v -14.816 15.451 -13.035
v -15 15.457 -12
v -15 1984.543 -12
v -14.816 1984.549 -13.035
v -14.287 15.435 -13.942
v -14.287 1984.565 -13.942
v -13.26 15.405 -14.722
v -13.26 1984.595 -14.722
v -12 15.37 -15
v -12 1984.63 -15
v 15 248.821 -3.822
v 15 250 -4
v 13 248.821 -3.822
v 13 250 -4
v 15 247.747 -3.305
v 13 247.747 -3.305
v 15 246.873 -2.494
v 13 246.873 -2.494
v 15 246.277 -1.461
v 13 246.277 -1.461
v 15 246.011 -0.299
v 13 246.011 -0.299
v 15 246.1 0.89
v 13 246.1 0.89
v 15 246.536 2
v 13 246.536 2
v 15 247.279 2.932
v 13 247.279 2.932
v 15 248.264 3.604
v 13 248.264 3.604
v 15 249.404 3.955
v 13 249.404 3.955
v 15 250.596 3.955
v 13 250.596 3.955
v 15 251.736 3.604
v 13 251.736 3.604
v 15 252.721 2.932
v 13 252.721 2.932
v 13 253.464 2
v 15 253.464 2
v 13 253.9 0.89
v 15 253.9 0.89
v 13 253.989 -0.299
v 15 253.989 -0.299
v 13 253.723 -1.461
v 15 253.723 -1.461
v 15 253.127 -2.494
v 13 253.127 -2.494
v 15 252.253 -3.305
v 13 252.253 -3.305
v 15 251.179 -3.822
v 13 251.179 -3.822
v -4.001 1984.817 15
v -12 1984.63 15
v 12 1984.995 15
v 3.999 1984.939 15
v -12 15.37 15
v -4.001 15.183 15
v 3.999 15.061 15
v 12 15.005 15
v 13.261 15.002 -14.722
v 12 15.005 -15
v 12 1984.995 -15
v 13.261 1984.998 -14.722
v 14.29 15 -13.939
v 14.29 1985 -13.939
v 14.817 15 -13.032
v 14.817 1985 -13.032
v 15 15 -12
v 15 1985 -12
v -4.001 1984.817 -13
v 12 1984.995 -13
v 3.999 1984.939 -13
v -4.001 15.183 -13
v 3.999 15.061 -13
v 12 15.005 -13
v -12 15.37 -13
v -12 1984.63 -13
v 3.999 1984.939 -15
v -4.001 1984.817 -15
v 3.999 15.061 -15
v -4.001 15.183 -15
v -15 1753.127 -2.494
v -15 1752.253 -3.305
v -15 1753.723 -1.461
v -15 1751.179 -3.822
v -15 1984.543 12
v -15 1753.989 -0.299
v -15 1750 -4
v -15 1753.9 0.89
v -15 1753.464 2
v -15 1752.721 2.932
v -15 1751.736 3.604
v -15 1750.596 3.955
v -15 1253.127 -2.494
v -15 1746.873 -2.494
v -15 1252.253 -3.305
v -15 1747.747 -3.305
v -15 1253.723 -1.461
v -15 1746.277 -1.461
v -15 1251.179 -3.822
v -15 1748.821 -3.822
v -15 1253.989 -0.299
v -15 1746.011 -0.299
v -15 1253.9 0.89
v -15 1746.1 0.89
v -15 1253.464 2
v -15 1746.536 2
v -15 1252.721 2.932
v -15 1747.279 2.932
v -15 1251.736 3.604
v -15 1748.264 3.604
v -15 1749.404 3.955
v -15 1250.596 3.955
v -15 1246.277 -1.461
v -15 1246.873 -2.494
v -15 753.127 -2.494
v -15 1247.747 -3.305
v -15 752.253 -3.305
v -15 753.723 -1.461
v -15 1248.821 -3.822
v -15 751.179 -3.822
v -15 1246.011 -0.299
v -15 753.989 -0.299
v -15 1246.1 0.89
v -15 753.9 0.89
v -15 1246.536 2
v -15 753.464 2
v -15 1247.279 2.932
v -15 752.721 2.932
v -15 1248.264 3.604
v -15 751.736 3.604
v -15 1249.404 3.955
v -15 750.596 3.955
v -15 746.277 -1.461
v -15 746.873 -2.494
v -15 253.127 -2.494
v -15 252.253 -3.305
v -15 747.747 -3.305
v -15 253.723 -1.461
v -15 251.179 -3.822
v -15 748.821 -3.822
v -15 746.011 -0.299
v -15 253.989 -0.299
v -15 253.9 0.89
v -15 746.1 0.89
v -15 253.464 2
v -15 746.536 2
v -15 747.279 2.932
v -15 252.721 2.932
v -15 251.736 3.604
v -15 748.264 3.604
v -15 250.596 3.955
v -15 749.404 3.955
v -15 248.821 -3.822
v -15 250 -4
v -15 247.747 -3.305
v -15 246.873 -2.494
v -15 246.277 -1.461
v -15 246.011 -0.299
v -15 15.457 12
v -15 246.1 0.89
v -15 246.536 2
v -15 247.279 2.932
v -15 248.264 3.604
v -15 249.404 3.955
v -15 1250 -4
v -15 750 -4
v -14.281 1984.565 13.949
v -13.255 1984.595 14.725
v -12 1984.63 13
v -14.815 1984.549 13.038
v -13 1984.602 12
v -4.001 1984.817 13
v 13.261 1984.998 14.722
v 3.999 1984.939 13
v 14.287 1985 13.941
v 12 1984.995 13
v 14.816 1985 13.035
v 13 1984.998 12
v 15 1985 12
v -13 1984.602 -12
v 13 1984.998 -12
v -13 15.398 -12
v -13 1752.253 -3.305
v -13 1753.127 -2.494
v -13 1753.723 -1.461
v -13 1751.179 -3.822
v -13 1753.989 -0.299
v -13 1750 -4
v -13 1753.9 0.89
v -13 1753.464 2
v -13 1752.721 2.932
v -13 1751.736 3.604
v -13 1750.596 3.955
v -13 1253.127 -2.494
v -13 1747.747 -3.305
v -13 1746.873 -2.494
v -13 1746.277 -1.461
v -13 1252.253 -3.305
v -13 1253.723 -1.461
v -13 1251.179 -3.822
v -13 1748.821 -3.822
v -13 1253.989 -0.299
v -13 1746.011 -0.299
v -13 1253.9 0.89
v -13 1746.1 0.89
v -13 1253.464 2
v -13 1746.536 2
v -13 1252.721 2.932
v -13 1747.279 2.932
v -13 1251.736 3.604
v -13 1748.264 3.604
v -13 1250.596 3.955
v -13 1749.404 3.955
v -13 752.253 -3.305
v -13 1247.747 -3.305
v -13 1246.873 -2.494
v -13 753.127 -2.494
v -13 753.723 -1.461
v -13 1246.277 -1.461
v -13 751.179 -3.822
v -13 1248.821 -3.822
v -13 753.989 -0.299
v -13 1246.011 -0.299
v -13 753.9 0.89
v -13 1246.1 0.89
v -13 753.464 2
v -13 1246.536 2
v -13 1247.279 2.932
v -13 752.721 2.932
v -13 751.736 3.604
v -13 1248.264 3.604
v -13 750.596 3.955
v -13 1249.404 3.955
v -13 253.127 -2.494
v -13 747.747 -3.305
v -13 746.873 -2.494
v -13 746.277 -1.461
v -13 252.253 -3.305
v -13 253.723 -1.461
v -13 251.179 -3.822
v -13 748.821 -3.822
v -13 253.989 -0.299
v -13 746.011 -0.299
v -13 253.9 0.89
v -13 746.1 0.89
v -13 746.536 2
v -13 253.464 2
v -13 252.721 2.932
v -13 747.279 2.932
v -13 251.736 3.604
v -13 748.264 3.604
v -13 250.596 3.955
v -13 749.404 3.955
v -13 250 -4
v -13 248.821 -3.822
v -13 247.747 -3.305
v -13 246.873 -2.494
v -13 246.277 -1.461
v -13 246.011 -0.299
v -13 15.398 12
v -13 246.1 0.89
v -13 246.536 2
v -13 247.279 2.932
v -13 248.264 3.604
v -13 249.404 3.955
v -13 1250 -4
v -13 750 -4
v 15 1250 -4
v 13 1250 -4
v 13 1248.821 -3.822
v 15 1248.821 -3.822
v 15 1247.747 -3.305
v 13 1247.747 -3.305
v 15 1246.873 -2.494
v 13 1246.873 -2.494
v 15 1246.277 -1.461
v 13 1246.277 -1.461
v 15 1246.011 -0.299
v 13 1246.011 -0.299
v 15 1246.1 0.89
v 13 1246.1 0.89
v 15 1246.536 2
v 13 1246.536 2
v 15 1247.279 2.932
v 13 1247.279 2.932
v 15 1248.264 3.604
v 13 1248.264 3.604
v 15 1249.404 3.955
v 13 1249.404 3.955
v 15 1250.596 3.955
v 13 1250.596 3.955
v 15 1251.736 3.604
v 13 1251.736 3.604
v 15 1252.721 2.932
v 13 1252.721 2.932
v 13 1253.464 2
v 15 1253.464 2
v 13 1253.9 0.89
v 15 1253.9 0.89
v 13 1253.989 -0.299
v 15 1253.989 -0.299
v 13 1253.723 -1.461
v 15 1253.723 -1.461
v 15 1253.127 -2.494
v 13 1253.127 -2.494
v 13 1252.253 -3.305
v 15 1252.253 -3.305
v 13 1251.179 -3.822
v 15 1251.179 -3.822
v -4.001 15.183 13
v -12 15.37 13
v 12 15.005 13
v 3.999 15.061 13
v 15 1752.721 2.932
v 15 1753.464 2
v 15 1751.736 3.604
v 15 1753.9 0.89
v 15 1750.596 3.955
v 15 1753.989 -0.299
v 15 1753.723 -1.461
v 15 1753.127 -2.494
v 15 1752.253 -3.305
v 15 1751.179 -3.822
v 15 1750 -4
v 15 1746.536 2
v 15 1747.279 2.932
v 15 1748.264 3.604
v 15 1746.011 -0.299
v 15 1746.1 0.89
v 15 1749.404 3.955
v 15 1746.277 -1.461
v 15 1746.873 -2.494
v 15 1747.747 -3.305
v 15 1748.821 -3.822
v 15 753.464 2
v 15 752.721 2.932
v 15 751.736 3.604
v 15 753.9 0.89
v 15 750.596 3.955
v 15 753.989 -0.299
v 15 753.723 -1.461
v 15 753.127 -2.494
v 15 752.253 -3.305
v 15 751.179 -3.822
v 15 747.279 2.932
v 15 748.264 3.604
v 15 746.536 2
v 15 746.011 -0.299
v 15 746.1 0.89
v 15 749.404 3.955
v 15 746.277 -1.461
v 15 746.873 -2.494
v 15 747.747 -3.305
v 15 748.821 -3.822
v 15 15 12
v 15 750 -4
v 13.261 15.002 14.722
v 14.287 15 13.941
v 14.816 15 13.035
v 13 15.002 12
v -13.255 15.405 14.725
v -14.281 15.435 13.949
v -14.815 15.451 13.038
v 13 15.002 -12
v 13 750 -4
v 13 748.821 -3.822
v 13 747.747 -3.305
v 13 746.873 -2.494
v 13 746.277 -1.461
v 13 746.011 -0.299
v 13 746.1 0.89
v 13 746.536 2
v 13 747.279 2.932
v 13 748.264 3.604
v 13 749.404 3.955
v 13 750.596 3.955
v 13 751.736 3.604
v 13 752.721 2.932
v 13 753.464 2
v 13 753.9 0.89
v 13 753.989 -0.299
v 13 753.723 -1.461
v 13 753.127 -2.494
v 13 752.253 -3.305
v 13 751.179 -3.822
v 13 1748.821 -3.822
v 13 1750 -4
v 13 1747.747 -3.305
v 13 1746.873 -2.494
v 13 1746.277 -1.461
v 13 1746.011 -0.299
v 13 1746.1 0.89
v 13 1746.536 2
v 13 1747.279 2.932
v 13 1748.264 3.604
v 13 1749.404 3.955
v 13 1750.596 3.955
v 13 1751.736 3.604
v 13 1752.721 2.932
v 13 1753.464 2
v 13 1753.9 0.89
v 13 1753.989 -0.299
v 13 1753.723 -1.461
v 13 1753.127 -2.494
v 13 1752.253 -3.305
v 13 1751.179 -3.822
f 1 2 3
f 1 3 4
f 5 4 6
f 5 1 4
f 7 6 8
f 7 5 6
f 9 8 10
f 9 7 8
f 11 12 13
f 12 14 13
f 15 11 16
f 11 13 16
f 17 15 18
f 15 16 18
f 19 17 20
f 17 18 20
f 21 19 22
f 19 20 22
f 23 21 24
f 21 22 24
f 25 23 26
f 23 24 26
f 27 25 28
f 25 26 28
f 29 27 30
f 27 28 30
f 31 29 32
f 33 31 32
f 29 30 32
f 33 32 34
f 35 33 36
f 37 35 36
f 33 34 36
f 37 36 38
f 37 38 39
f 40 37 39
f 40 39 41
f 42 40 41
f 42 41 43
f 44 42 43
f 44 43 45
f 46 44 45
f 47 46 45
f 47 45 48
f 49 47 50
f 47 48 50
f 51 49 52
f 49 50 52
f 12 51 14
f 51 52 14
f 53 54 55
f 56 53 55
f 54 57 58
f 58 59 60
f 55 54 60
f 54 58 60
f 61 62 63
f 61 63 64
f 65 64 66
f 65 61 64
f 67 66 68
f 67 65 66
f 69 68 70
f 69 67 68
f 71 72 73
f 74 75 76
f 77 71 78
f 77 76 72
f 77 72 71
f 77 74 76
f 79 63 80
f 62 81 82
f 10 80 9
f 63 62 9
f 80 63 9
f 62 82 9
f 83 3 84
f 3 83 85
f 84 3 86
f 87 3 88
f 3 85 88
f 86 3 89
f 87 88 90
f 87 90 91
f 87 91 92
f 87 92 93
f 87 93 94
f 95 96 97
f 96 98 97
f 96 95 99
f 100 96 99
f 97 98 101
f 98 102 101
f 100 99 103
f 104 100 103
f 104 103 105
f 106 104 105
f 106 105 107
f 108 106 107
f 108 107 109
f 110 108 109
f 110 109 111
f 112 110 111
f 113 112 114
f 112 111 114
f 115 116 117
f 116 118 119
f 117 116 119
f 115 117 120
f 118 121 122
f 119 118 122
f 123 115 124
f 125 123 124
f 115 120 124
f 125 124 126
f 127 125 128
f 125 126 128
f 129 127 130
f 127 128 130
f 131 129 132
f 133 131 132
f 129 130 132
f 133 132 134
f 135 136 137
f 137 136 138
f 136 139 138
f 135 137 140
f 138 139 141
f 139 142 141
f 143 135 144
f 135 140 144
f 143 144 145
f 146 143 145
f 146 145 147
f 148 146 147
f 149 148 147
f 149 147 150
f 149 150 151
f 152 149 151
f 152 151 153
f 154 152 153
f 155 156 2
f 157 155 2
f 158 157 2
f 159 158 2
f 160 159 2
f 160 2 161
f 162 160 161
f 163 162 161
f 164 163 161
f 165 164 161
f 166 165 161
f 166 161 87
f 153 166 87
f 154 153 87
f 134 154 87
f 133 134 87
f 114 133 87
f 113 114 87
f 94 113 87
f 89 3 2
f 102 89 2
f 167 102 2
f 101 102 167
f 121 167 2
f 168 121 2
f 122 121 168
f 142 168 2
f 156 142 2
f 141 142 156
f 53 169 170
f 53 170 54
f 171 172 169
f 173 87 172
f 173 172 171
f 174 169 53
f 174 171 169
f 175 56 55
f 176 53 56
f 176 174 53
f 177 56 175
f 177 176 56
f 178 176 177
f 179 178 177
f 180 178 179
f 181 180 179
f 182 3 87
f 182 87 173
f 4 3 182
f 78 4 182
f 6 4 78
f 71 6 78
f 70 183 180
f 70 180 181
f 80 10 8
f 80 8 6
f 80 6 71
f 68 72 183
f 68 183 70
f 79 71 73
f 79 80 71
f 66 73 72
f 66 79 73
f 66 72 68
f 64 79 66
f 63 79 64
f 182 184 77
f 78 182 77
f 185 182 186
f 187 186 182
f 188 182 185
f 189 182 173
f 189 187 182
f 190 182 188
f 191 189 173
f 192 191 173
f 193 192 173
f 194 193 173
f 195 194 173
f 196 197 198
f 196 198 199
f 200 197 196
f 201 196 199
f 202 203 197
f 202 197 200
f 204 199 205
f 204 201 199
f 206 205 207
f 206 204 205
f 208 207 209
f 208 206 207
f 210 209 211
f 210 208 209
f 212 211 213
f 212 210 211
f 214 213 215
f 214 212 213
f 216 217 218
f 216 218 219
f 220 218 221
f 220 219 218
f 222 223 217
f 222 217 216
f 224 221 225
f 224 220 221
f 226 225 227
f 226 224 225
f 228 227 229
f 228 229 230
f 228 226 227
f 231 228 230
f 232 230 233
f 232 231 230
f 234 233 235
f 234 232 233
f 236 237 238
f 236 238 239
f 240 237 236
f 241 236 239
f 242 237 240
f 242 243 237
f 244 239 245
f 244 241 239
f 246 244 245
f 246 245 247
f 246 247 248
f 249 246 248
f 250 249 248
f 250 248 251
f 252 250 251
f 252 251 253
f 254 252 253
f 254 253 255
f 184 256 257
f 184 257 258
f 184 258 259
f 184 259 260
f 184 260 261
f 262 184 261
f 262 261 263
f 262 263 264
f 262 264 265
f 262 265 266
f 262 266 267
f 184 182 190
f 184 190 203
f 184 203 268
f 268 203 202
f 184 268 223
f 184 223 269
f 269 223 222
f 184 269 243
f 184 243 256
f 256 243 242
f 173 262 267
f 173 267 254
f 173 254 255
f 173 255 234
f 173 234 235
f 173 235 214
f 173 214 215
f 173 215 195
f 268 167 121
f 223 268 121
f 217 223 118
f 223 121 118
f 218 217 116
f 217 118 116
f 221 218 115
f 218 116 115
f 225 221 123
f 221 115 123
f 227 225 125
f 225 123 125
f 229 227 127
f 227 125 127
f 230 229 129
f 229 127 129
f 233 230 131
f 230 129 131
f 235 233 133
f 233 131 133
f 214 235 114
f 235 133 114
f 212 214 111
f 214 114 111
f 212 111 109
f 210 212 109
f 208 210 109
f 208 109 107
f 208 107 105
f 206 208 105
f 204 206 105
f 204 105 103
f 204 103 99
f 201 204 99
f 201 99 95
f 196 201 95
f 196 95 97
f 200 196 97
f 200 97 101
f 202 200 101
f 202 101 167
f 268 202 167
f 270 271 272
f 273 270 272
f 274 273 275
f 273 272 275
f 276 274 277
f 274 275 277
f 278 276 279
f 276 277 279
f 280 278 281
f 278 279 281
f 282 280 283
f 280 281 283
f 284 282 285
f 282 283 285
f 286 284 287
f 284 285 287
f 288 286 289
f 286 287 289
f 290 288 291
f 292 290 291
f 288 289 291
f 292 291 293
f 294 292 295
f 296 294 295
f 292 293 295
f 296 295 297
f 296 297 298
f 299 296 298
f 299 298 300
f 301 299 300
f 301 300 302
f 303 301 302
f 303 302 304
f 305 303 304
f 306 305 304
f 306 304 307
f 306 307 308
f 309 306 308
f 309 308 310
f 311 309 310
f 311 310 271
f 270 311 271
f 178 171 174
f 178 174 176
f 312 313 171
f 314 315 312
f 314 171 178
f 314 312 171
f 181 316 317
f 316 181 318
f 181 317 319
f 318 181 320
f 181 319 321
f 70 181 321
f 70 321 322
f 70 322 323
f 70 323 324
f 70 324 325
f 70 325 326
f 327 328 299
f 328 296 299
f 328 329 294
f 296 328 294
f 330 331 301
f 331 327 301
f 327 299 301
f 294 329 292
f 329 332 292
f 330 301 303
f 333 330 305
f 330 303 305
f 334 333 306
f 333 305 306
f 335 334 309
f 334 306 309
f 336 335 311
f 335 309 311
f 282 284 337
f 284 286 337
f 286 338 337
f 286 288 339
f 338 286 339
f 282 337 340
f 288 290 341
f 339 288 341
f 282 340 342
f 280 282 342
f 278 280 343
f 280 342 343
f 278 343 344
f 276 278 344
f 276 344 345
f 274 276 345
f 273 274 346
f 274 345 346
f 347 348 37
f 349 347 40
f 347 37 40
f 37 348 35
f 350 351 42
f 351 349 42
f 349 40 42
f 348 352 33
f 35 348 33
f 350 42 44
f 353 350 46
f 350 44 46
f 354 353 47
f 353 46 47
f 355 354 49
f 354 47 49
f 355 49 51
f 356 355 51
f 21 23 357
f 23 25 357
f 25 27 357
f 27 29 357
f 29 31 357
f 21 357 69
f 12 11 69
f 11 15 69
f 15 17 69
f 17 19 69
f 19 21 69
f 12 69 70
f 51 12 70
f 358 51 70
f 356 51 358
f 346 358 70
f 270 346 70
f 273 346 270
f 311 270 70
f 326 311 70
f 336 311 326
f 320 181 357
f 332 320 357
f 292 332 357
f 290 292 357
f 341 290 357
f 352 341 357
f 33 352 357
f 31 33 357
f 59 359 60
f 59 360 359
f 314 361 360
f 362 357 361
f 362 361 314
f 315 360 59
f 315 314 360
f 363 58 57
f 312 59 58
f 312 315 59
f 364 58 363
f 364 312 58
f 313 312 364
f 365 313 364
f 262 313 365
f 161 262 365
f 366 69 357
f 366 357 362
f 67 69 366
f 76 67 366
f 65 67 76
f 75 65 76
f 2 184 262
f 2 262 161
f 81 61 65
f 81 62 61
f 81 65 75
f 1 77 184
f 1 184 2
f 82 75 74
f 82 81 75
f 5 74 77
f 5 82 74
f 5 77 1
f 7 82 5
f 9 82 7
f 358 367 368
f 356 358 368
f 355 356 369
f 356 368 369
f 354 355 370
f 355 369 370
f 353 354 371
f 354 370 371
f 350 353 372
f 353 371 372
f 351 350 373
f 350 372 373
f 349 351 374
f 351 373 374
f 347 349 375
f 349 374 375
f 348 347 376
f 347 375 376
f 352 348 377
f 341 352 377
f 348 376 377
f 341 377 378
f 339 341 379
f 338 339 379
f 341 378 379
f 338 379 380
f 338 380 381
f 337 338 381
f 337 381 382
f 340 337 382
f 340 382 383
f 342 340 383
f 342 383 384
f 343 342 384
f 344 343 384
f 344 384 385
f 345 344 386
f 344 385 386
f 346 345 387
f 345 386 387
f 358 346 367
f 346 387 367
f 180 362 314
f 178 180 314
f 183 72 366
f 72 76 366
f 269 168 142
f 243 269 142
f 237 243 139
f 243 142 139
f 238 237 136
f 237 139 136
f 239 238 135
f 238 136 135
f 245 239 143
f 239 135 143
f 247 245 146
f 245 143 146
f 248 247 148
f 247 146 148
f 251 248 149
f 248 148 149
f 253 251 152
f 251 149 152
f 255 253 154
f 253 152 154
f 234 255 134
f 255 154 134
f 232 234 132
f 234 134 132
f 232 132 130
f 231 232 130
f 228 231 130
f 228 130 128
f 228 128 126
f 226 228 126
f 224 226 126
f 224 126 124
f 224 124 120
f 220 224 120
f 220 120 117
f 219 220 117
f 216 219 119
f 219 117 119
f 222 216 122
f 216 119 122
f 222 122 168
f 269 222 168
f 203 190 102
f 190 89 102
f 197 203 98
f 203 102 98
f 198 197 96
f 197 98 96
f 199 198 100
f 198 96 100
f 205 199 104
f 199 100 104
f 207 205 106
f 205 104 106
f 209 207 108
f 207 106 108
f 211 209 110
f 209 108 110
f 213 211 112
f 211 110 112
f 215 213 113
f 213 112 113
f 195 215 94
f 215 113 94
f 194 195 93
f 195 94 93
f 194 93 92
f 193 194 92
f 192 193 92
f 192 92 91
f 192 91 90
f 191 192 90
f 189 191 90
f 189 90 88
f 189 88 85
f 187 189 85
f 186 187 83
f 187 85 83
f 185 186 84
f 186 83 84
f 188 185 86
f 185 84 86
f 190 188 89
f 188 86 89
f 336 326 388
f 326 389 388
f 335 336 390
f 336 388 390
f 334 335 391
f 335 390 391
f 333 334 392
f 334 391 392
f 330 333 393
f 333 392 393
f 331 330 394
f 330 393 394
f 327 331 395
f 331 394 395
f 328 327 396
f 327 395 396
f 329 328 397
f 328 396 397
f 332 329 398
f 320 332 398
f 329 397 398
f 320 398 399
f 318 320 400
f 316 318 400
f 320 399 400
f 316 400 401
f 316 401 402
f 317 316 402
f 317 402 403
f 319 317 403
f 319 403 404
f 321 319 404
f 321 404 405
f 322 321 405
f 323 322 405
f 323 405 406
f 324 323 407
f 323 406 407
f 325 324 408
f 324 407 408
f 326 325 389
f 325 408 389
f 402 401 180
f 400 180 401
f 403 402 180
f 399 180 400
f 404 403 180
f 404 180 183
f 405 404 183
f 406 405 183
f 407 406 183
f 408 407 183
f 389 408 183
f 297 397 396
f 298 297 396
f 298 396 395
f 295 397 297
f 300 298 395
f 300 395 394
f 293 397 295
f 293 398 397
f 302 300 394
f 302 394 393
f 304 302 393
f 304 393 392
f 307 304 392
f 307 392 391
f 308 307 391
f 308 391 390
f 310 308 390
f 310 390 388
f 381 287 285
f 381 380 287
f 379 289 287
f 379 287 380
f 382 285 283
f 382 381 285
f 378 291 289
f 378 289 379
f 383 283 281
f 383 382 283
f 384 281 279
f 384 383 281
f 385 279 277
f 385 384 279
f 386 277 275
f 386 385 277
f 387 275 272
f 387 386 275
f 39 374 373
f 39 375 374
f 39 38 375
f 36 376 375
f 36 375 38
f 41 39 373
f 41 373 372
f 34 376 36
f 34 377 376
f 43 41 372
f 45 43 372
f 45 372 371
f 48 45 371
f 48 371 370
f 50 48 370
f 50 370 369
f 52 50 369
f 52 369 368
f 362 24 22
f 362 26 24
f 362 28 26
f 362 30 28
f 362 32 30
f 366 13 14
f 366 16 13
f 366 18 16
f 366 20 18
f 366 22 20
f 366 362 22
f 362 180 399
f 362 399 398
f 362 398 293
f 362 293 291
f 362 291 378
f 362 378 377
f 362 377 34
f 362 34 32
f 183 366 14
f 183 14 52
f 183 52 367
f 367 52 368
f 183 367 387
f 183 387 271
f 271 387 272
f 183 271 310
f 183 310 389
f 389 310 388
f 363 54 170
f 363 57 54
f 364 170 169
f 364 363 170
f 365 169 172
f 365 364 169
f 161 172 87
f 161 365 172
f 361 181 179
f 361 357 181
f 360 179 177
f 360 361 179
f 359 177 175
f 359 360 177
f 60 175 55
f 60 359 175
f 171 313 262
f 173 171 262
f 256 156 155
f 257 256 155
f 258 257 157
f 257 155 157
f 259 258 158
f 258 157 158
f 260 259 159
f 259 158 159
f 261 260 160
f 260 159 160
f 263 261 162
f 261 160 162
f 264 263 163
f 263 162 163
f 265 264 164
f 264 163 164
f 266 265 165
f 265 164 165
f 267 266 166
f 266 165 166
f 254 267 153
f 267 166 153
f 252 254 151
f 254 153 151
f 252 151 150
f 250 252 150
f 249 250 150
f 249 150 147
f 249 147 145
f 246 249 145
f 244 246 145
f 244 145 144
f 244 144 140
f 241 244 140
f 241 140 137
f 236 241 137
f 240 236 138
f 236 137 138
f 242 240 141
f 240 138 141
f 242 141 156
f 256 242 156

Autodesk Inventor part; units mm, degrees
ref_plane "YZ Plane" through (0, 0, 0) normal (1, 0, 0) x (0, 1, 0)
ref_plane "XZ Plane" through (0, 0, 0) normal (0, 1, 0) x (-1, 0, 0)
ref_plane "XY Plane" through (0, 0, 0) normal (0, 0, 1) x (1, 0, 0)
sketch "Sketch1" plane through (0, 0, 0) normal (0, 1, 0) x (-1, 0, 0)
  line L0 (-12, 14) -> (12, 14) construction
  line L1 (14, 12) -> (14, -12) construction
  line L2 (12, -14) -> (-12, -14) construction
  line L3 (-14, -12) -> (-14, 12) construction
  line L4 (-14, 14) -> (14, -14) construction
  line L5 (14, 14) -> (-14, -14) construction
  arc A0 (14, 12) -> (12, 14) centre (12, 12) ccw construction
  arc A1 (12, -14) -> (14, -12) centre (12, -12) ccw construction
  arc A2 (-14, -12) -> (-12, -14) centre (-12, -12) ccw construction
  arc A3 (-12, 14) -> (-14, 12) centre (-12, 12) ccw construction
  line L6 (-12, -15) -> (12, -15)
  arc A4 (12, -15) -> (15, -12) centre (12, -12) ccw
  line L7 (15, -12) -> (15, 12)
  arc A5 (15, 12) -> (12, 15) centre (12, 12) ccw
  line L8 (12, 15) -> (-12, 15)
  arc A6 (-12, 15) -> (-15, 12) centre (-12, 12) ccw
  line L9 (-15, 12) -> (-15, -12)
  arc A7 (-15, -12) -> (-12, -15) centre (-12, -12) ccw
  line L10 (13, -12) -> (13, 12)
  arc A8 (13, 12) -> (12, 13) centre (12, 12) ccw
  line L11 (12, 13) -> (-12, 13)
  arc A9 (-12, 13) -> (-13, 12) centre (-12, 12) ccw
  line L12 (-13, 12) -> (-13, -12)
  arc A10 (-13, -12) -> (-12, -13) centre (-12, -12) ccw
  line L13 (-12, -13) -> (12, -13)
  arc A11 (12, -13) -> (13, -12) centre (12, -12) ccw
  point P0 (0, 0)
  point P1 (0, 0)
  point P2 (0, 0)
  dimension "d10" = 2
  dimension "depth" = 30
  dimension "width" = 30
  dimension "thickness" = 2
extrude "Extrusion1" add sketch "Sketch1" along normal blind 2000
ref_plane "Work Plane1" through (0, 1000, 0) normal (0, -1, 0) x (1, 0, 0)
sketch "Sketch3" plane through (12, 0, -15) normal (0, 0, -1) x (-1, 0, 0)
  line L0 (12, -400) -> (12, 2400) construction
  circle A0 centre (-3, 1000) radius 985
  point P0 (12, 0)
  dimension "d29" = 1970
  dimension "d31" = 1000
  dimension "d34" = 15
extrude "Extrusion2" cut sketch "Sketch3" against normal through all keep common part
sketch "Sketch4" plane through (15, 15, 12) normal (1, 0, 0) x (0, 0, -1)
  line L0 (33.0025, 985) -> (-9.0025, 985) construction
  line L1 (12, -412.0004) -> (12, 2367.0022) projected
  point P0 (12, -15)
  point P1 (12, 235)
  point P2 (12, 985)
  point P3 (12, 1735)
  point P4 (12, 735)
  point P5 (12, 1235)
  dimension "d35" = 1500
  dimension "d36" = 500
hole "Hole2" at (15, 250, 0) at (15, 1750, 0) at (15, 750, 0) at (15, 1250, 0) direction (-1, 0, 0) diameter 8 depth 40 tip angle 118
equation "\"d10\" = thickness"
properties part number "podest duzy profil 1" material "Steel"
